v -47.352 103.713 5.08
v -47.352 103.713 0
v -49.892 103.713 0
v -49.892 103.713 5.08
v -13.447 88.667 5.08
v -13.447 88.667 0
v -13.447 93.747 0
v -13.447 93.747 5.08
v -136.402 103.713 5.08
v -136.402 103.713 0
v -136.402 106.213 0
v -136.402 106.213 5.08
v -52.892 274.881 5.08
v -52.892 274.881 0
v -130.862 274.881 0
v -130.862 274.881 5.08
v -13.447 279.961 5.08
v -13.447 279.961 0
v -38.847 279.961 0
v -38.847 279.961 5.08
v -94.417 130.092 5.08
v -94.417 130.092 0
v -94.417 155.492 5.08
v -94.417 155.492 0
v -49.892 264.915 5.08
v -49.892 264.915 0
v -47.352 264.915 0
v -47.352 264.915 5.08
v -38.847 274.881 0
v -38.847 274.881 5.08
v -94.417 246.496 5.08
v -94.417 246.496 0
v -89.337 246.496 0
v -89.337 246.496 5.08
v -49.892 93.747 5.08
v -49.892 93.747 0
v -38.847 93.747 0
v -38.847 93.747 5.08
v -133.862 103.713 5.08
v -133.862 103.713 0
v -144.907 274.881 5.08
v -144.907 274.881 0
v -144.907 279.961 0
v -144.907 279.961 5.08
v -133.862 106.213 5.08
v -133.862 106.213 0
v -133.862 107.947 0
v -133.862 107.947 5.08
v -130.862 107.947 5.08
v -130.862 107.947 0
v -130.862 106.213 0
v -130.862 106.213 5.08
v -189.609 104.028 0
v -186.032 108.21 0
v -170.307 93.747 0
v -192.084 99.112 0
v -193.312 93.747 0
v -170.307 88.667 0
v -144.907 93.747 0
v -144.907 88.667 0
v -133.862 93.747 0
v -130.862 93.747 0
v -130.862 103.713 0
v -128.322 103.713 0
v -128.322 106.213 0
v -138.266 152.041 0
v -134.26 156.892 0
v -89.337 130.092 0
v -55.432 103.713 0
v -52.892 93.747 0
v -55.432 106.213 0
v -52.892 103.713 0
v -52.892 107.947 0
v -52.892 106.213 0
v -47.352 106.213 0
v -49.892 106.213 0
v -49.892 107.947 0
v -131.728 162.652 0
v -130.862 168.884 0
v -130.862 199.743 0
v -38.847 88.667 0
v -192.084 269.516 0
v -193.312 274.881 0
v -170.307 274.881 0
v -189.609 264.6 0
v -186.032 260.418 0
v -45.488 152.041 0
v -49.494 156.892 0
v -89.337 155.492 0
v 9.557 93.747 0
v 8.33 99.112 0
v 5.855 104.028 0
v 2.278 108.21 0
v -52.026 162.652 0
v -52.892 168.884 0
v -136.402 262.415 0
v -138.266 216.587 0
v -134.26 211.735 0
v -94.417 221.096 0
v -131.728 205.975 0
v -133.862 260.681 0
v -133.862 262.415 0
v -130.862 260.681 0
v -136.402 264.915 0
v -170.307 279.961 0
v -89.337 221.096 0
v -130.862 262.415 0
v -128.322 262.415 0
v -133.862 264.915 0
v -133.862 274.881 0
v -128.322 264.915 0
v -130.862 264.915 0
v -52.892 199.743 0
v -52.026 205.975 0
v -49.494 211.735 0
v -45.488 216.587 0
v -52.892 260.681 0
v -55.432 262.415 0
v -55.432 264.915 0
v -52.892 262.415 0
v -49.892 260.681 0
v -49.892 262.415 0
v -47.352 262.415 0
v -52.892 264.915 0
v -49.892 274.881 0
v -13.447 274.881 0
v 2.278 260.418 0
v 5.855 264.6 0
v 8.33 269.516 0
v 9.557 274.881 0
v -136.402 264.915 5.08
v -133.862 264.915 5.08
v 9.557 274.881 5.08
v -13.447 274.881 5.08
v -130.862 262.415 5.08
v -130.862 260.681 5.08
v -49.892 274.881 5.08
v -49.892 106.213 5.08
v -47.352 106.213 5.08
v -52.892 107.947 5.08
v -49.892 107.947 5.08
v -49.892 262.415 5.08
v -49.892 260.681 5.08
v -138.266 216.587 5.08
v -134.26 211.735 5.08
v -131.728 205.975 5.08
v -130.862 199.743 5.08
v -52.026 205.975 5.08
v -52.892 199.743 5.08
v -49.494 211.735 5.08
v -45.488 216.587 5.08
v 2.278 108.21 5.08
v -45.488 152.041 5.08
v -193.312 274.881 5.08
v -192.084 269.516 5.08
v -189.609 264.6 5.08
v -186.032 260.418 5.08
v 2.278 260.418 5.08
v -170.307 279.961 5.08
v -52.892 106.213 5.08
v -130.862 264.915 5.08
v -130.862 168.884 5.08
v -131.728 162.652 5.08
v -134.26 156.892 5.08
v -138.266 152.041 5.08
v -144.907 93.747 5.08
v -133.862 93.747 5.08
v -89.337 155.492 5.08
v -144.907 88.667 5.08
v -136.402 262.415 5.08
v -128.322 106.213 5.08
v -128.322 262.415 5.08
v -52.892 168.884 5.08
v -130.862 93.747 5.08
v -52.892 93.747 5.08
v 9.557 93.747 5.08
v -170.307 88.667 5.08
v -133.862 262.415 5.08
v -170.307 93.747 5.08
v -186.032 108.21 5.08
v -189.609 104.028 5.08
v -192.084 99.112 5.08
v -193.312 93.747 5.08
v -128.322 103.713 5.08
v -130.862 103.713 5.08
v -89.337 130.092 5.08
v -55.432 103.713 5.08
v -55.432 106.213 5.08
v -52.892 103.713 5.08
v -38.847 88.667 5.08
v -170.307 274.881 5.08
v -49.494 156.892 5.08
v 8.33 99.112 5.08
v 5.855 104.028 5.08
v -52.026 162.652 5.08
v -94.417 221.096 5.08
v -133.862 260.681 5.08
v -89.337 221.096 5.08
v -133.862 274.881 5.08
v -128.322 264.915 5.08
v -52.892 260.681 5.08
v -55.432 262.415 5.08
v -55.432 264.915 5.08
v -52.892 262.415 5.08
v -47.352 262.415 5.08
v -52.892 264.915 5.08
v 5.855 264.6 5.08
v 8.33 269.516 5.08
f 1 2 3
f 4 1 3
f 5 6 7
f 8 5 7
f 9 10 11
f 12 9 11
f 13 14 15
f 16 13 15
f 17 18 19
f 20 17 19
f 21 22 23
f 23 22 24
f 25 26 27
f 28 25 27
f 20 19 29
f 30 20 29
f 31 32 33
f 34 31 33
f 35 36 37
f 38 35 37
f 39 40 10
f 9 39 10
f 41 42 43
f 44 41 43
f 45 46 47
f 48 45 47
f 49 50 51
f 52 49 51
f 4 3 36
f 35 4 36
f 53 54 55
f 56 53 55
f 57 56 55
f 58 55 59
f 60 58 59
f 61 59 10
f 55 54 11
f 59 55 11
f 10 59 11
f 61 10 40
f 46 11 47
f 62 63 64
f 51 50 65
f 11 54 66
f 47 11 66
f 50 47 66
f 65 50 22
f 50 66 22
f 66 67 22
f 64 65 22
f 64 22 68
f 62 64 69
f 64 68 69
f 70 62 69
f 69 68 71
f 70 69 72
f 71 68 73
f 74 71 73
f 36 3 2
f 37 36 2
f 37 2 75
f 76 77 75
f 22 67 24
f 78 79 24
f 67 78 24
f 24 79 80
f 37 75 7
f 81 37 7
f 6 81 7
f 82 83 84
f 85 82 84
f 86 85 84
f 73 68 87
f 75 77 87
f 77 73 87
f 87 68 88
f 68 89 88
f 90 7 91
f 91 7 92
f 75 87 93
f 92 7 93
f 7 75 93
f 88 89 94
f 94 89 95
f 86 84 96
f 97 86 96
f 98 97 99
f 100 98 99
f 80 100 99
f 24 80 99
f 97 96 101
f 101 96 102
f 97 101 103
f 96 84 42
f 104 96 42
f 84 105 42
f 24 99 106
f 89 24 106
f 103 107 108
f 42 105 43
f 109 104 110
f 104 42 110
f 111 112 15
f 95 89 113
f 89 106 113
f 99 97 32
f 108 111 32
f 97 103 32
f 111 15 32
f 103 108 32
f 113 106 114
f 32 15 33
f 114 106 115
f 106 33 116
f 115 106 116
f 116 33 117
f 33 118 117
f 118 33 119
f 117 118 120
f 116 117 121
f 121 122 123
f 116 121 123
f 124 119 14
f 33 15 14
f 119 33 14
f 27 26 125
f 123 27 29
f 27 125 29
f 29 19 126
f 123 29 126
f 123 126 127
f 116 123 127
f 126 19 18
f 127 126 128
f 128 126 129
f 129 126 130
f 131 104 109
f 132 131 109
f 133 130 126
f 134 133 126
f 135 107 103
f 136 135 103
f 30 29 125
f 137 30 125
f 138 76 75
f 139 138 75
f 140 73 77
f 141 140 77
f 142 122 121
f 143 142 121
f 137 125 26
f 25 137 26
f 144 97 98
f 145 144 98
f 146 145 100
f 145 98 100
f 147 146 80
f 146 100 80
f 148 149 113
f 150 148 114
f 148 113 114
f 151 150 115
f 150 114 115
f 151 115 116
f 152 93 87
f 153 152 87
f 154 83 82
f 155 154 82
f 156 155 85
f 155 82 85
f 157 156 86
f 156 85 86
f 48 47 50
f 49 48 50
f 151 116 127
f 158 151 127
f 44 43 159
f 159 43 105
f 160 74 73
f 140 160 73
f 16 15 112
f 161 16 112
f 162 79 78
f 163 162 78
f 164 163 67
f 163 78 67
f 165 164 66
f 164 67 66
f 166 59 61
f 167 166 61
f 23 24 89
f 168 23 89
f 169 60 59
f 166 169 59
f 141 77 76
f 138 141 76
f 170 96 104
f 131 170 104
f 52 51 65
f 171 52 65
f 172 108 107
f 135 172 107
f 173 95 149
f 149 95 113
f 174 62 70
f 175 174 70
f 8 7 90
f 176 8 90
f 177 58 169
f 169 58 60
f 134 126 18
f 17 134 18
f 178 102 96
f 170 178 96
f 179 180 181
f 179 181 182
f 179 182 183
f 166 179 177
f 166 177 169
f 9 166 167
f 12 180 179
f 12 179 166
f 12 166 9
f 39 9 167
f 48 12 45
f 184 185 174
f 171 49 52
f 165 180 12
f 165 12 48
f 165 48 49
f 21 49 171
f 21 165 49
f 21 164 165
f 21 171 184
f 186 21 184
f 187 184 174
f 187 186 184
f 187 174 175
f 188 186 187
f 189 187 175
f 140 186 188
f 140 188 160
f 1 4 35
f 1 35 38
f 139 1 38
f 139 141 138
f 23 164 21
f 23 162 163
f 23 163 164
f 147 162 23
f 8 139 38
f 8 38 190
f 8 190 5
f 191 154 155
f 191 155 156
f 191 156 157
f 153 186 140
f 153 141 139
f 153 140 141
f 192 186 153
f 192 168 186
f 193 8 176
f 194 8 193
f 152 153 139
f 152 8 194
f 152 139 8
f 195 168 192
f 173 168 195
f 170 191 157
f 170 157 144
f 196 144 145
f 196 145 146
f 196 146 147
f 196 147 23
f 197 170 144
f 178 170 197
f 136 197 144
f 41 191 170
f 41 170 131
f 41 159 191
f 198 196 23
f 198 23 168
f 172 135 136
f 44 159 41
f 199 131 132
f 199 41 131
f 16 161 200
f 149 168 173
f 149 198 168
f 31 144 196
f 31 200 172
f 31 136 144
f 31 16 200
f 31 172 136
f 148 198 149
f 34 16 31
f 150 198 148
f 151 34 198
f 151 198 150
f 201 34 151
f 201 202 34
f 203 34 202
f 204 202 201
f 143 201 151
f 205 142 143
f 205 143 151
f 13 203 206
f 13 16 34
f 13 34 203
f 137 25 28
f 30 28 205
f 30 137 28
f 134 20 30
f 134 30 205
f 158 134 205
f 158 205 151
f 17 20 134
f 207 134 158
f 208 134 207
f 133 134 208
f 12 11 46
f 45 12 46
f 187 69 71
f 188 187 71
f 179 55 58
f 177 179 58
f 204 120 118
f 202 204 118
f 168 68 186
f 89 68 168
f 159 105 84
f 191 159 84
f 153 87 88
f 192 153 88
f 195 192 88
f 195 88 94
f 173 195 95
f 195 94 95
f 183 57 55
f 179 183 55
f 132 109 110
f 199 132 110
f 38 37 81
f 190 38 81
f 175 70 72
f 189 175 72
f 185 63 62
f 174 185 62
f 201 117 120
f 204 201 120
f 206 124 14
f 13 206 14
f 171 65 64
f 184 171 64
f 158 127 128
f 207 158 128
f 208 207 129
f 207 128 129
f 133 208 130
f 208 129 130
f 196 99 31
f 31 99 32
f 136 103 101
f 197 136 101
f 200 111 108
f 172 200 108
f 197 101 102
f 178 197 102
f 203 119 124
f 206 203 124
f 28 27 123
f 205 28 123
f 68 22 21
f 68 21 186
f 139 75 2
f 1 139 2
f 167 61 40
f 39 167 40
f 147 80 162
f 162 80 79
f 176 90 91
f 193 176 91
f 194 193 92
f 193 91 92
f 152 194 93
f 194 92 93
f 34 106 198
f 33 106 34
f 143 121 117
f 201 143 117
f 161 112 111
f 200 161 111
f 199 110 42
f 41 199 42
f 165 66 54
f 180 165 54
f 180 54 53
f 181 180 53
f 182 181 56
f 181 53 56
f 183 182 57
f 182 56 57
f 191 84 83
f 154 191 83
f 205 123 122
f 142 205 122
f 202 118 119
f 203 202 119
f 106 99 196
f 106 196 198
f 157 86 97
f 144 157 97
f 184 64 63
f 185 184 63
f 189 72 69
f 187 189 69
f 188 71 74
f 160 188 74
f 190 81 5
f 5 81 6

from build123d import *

# Parameters (mm, degrees)
SKETCH1_W           = 5.08
SKETCH1_H           = 25.4
BOSS_EXTRUDE1_DEPTH = 5.08


with BuildPart() as part:
    # Sketch1 → Boss-Extrude1 (new body)
    with BuildSketch(Plane.XY):
        with BuildLine():
            Line((-13.447242614, 88.667051475), (-13.447242614, 93.747051475))
            Line((-13.447242614, 93.747051475), (9.557461427, 93.747051475))
            ThreePointArc((9.557461427, 93.747051475), (7.2409193, 101.644458486), (2.277698276, 108.209657797))
            Line((2.277698276, 108.209657797), (-45.487793081, 152.041039764))
            ThreePointArc((-45.487793081, 152.041039764), (-50.959133788, 159.684872704), (-52.891849255, 168.884240186))
            Line((-52.891849255, 168.884240186), (-52.891849255, 188.293861482))
            Line((-52.891849255, 188.293861482), (-52.891849255, 199.743466198))
            ThreePointArc((-52.891849255, 199.743466198), (-50.959133788, 208.94283368), (-45.487793081, 216.58666662))
            Line((-45.487793081, 216.58666662), (2.277698276, 260.418048586))
            ThreePointArc((2.277698276, 260.418048586), (7.2409193, 266.983247897), (9.557461427, 274.880654909))
            Line((9.557461427, 274.880654909), (-13.447242614, 274.880654909))
            Line((-13.447242614, 274.880654909), (-13.447242614, 279.960654909))
            Line((-13.447242614, 279.960654909), (-14.800406259, 279.960654909))
            Line((-14.800406259, 279.960654909), (-38.847242614, 279.960654909))
            Line((-38.847242614, 279.960654909), (-38.847242614, 274.880654909))
            Line((-38.847242614, 274.880654909), (-49.891849255, 274.880654909))
            Line((-49.891849255, 274.880654909), (-49.891849255, 264.914705614))
            Line((-49.891849255, 264.914705614), (-47.351849255, 264.914705614))
            Line((-47.351849255, 264.914705614), (-47.351849255, 262.414705614))
            Line((-47.351849255, 262.414705614), (-49.891849255, 262.414705614))
            Line((-49.891849255, 262.414705614), (-49.891849255, 260.680654909))
            Line((-49.891849255, 260.680654909), (-52.891849255, 260.680654909))
            Line((-52.891849255, 260.680654909), (-52.891849255, 262.414705614))
            Line((-52.891849255, 262.414705614), (-55.431849255, 262.414705614))
            Line((-55.431849255, 262.414705614), (-55.431849255, 264.914705614))
            Line((-55.431849255, 264.914705614), (-52.891849255, 264.914705614))
            Line((-52.891849255, 264.914705614), (-52.891849255, 274.880654909))
            Line((-52.891849255, 274.880654909), (-130.862222045, 274.880654909))
            Line((-130.862222045, 274.880654909), (-130.862222045, 264.914705614))
            Line((-130.862222045, 264.914705614), (-128.322222045, 264.914705614))
            Line((-128.322222045, 264.914705614), (-128.322222045, 262.414705614))
            Line((-128.322222045, 262.414705614), (-130.862222045, 262.414705614))
            Line((-130.862222045, 262.414705614), (-130.862222045, 260.680654909))
            Line((-130.862222045, 260.680654909), (-133.862222045, 260.680654909))
            Line((-133.862222045, 260.680654909), (-133.862222045, 262.414705614))
            Line((-133.862222045, 262.414705614), (-136.402222045, 262.414705614))
            Line((-136.402222045, 262.414705614), (-136.402222045, 264.914705614))
            Line((-136.402222045, 264.914705614), (-133.862222045, 264.914705614))
            Line((-133.862222045, 264.914705614), (-133.862222045, 274.880654909))
            Line((-133.862222045, 274.880654909), (-144.906828687, 274.880654909))
            Line((-144.906828687, 274.880654909), (-144.906828687, 279.960654909))
            Line((-144.906828687, 279.960654909), (-168.953665042, 279.960654909))
            Line((-168.953665042, 279.960654909), (-170.306828687, 279.960654909))
            Line((-170.306828687, 279.960654909), (-170.306828687, 274.880654909))
            Line((-170.306828687, 274.880654909), (-193.311532727, 274.880654909))
            ThreePointArc((-193.311532727, 274.880654909), (-190.9949906, 266.983247897), (-186.031769576, 260.418048586))
            Line((-186.031769576, 260.418048586), (-138.266278219, 216.58666662))
            ThreePointArc((-138.266278219, 216.58666662), (-132.794937512, 208.94283368), (-130.862222045, 199.743466198))
            Line((-130.862222045, 199.743466198), (-130.862222045, 188.293861482))
            Line((-130.862222045, 188.293861482), (-130.862222045, 168.884240186))
            ThreePointArc((-130.862222045, 168.884240186), (-132.794937512, 159.684872704), (-138.266278219, 152.041039764))
            Line((-138.266278219, 152.041039764), (-186.031769576, 108.209657797))
            ThreePointArc((-186.031769576, 108.209657797), (-190.9949906, 101.644458486), (-193.311532727, 93.747051475))
            Line((-193.311532727, 93.747051475), (-170.306828687, 93.747051475))
            Line((-170.306828687, 93.747051475), (-170.306828687, 88.667051475))
            Line((-170.306828687, 88.667051475), (-168.953665042, 88.667051475))
            Line((-168.953665042, 88.667051475), (-144.906828687, 88.667051475))
            Line((-144.906828687, 88.667051475), (-144.906828687, 93.747051475))
            Line((-144.906828687, 93.747051475), (-133.862222045, 93.747051475))
            Line((-133.862222045, 93.747051475), (-133.862222045, 103.713000769))
            Line((-133.862222045, 103.713000769), (-136.402222045, 103.713000769))
            Line((-136.402222045, 103.713000769), (-136.402222045, 106.213000769))
            Line((-136.402222045, 106.213000769), (-133.862222045, 106.213000769))
            Line((-133.862222045, 106.213000769), (-133.862222045, 107.947051475))
            Line((-133.862222045, 107.947051475), (-130.862222045, 107.947051475))
            Line((-130.862222045, 107.947051475), (-130.862222045, 106.213000769))
            Line((-130.862222045, 106.213000769), (-128.322222045, 106.213000769))
            Line((-128.322222045, 106.213000769), (-128.322222045, 103.713000769))
            Line((-128.322222045, 103.713000769), (-130.862222045, 103.713000769))
            Line((-130.862222045, 103.713000769), (-130.862222045, 93.747051475))
            Line((-130.862222045, 93.747051475), (-52.891849255, 93.747051475))
            Line((-52.891849255, 93.747051475), (-52.891849255, 103.713000769))
            Line((-52.891849255, 103.713000769), (-55.431849255, 103.713000769))
            Line((-55.431849255, 103.713000769), (-55.431849255, 106.213000769))
            Line((-55.431849255, 106.213000769), (-52.891849255, 106.213000769))
            Line((-52.891849255, 106.213000769), (-52.891849255, 107.947051475))
            Line((-52.891849255, 107.947051475), (-49.891849255, 107.947051475))
            Line((-49.891849255, 107.947051475), (-49.891849255, 106.213000769))
            Line((-49.891849255, 106.213000769), (-47.351849255, 106.213000769))
            Line((-47.351849255, 106.213000769), (-47.351849255, 103.713000769))
            Line((-47.351849255, 103.713000769), (-49.891849255, 103.713000769))
            Line((-49.891849255, 103.713000769), (-49.891849255, 93.747051475))
            Line((-49.891849255, 93.747051475), (-38.847242614, 93.747051475))
            Line((-38.847242614, 93.747051475), (-38.847242614, 88.667051475))
            Line((-38.847242614, 88.667051475), (-14.800406259, 88.667051475))
            Line((-14.800406259, 88.667051475), (-13.447242614, 88.667051475))
        make_face()
        with Locations((-91.87703565, 142.791515907)):
            Rectangle(SKETCH1_W, SKETCH1_H, mode=Mode.SUBTRACT)
        with Locations((-91.87703565, 233.796207057)):
            Rectangle(SKETCH1_W, SKETCH1_H, mode=Mode.SUBTRACT)
    extrude(amount=BOSS_EXTRUDE1_DEPTH)


solid = part.part
